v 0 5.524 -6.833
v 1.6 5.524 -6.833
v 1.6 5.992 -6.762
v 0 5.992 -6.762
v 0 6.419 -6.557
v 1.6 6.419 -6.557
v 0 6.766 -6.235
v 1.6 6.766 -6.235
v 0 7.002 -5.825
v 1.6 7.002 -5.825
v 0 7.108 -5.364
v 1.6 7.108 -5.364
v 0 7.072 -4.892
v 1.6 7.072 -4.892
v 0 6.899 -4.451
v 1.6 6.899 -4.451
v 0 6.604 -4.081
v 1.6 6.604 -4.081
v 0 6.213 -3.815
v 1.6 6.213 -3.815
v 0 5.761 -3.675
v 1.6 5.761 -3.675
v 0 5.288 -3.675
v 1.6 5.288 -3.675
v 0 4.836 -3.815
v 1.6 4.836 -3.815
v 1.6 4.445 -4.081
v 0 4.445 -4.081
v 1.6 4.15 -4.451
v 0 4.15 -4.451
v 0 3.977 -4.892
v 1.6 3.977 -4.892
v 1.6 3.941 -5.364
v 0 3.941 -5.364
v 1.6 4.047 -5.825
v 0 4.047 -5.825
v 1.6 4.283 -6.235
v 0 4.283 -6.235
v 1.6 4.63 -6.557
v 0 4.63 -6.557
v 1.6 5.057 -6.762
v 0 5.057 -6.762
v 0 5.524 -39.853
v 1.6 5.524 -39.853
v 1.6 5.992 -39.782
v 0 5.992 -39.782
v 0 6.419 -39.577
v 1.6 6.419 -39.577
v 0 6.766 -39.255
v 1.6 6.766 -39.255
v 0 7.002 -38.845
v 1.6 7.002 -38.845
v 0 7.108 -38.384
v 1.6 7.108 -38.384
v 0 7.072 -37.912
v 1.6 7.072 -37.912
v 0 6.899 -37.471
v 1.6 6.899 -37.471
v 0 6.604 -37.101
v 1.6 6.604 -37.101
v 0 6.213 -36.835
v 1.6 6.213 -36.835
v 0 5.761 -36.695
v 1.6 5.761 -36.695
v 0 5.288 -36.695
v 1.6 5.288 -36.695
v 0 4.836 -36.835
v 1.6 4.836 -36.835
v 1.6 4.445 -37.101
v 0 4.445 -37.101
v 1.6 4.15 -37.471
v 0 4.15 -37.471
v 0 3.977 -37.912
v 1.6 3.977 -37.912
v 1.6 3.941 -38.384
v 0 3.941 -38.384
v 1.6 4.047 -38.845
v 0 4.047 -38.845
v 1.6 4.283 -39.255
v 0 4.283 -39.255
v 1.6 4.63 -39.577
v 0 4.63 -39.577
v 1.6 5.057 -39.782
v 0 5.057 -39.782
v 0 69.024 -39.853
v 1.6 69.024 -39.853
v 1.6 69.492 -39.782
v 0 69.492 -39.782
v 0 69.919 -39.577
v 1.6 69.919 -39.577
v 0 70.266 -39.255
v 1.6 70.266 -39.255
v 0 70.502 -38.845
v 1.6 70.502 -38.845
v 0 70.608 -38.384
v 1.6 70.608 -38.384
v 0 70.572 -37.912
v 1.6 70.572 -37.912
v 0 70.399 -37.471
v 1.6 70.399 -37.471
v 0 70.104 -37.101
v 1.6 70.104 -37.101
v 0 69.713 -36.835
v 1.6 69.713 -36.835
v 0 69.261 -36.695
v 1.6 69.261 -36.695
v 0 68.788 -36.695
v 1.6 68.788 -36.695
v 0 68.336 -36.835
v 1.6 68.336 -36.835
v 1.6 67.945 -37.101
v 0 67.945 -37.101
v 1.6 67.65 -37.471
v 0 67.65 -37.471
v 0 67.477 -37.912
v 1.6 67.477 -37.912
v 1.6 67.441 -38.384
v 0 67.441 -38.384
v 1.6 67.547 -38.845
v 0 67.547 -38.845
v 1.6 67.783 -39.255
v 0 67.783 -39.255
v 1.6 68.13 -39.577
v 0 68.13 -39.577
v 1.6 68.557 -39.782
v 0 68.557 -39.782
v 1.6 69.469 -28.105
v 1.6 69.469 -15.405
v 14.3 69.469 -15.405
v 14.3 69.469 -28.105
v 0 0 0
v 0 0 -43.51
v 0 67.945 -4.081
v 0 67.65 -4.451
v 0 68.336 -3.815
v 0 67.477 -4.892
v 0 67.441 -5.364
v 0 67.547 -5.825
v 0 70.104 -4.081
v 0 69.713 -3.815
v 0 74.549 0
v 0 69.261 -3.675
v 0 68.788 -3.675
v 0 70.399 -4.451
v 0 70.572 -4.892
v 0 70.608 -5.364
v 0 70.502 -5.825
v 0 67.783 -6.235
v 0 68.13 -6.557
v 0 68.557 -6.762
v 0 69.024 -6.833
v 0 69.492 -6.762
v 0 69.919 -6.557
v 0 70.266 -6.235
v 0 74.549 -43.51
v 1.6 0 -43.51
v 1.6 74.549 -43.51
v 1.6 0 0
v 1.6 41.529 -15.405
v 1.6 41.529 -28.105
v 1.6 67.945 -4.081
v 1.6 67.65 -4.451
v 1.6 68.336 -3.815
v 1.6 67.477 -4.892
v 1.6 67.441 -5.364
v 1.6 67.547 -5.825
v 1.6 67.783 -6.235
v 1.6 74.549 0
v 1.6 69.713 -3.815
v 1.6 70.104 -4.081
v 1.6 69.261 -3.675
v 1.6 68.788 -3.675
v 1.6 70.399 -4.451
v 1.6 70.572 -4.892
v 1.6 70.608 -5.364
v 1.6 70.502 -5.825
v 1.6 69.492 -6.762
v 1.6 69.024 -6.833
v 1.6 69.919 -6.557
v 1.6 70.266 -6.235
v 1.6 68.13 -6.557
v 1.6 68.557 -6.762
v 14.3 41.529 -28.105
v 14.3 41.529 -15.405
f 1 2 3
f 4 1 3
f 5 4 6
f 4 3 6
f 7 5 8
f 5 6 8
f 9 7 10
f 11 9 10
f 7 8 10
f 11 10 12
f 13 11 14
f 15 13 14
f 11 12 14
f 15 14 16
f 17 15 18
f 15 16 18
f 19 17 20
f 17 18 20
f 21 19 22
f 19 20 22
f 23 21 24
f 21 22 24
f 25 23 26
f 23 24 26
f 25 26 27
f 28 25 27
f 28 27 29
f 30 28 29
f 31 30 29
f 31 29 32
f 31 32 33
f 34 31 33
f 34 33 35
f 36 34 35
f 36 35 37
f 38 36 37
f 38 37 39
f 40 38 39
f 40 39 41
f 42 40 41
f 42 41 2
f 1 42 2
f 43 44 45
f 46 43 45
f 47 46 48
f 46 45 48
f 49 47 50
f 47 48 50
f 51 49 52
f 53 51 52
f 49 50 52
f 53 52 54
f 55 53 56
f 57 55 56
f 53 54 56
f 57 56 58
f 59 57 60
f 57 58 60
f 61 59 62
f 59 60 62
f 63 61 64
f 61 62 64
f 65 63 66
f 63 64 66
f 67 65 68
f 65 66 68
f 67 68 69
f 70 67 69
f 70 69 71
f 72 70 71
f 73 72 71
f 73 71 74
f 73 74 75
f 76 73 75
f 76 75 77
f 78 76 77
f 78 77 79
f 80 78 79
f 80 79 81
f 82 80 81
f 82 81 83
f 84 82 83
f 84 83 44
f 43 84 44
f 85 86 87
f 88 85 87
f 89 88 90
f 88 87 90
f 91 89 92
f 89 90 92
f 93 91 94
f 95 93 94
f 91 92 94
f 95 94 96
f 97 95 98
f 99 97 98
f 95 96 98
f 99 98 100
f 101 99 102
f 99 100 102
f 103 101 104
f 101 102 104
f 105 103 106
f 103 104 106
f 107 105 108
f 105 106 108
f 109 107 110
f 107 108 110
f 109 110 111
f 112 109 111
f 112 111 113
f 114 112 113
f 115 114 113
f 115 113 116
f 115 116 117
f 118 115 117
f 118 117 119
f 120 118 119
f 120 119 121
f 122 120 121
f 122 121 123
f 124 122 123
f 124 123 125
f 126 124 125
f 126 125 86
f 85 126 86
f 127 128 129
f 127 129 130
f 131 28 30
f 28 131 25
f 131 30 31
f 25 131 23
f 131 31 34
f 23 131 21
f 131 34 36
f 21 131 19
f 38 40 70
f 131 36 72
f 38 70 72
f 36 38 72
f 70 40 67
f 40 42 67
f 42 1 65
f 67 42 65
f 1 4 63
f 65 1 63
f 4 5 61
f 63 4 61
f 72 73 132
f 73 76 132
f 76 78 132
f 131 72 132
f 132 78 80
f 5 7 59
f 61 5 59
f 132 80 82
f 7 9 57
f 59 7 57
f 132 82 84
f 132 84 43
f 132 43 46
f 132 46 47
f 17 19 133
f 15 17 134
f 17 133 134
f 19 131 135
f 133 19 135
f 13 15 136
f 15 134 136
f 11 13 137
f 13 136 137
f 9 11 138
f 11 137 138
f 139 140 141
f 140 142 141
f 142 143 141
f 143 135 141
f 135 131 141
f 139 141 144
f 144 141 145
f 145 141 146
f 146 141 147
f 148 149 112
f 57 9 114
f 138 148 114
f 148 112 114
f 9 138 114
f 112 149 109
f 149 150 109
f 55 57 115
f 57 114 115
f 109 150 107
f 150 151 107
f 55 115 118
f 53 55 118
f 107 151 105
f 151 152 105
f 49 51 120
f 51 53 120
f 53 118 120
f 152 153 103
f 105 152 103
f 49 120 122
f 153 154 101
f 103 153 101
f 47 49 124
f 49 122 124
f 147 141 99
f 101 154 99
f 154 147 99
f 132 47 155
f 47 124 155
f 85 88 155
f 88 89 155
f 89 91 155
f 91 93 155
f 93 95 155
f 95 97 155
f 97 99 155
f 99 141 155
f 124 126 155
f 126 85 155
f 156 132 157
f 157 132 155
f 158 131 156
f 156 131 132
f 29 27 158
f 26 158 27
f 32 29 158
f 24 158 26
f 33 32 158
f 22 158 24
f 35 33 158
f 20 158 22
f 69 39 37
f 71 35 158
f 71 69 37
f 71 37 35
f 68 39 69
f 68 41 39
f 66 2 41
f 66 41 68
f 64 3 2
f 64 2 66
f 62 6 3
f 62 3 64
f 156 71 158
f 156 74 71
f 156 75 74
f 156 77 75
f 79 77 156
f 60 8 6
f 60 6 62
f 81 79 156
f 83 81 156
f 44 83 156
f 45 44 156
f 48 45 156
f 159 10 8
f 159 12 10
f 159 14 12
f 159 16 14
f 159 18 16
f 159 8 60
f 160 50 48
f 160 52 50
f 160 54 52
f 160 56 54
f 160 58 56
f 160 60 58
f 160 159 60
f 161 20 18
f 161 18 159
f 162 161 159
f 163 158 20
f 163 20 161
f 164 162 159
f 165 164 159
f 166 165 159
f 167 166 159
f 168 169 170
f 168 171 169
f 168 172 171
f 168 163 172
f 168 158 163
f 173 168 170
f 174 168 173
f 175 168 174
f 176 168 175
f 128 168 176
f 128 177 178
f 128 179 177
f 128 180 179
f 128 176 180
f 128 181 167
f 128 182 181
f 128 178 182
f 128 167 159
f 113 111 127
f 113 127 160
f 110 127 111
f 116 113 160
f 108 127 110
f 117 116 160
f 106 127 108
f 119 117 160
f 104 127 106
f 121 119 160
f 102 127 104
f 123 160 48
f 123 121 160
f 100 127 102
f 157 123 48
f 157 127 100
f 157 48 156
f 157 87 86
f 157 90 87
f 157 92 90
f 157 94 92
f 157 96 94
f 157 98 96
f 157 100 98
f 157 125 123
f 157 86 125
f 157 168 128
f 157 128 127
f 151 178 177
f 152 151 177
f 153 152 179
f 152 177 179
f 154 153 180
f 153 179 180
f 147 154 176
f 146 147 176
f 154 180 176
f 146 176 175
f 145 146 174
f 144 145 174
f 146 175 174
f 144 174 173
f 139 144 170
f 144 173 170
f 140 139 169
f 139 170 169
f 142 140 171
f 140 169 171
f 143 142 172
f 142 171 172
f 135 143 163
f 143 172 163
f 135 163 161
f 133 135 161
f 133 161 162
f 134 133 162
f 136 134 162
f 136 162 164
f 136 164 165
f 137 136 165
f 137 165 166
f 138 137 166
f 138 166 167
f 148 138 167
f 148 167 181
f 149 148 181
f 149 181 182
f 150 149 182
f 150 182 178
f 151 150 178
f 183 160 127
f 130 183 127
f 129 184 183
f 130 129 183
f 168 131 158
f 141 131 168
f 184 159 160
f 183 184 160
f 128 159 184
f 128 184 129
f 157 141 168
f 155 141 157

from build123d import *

# Parameters (mm, degrees)
SKETCH1_W          = 43.5102
SKETCH1_H          = 74.549
EXTRUDE1_DEPTH     = 1.6002
SKETCH2_R          = 1.5875
CUT_EXTRUDE1_DEPTH = 2.6002
SKETCH3_W          = 12.7
SKETCH3_H          = 27.94
EXTRUDE2_DEPTH     = 12.7


with BuildPart() as part:
    # Sketch1 → Extrude1 (new body)
    with BuildSketch(Plane(origin=(0, 0, 0), x_dir=(0, 0, -1), z_dir=(1, 0, 0))):
        with Locations((21.7551, 37.2745)):
            Rectangle(SKETCH1_W, SKETCH1_H)
    extrude(amount=EXTRUDE1_DEPTH)

    # Sketch2 → Cut-Extrude1 (cut, through all)
    with BuildSketch(Plane(origin=(1.6002, 0, 0), x_dir=(0, 0, -1), z_dir=(1, 0, 0))):
        with Locations((5.2451, 69.0245)):
            Circle(SKETCH2_R)
        with Locations((38.2651, 69.0245)):
            Circle(SKETCH2_R)
        with Locations((38.2651, 5.5245)):
            Circle(SKETCH2_R)
        with Locations((5.2451, 5.5245)):
            Circle(SKETCH2_R)
    extrude(amount=-CUT_EXTRUDE1_DEPTH, mode=Mode.SUBTRACT)

    # Sketch3 → Extrude2 (add)
    with BuildSketch(Plane(origin=(1.6002, 0, 0), x_dir=(0, 0, -1), z_dir=(1, 0, 0))):
        with Locations((21.7551, 55.499)):
            Rectangle(SKETCH3_W, SKETCH3_H)
    extrude(amount=EXTRUDE2_DEPTH)


solid = part.part
